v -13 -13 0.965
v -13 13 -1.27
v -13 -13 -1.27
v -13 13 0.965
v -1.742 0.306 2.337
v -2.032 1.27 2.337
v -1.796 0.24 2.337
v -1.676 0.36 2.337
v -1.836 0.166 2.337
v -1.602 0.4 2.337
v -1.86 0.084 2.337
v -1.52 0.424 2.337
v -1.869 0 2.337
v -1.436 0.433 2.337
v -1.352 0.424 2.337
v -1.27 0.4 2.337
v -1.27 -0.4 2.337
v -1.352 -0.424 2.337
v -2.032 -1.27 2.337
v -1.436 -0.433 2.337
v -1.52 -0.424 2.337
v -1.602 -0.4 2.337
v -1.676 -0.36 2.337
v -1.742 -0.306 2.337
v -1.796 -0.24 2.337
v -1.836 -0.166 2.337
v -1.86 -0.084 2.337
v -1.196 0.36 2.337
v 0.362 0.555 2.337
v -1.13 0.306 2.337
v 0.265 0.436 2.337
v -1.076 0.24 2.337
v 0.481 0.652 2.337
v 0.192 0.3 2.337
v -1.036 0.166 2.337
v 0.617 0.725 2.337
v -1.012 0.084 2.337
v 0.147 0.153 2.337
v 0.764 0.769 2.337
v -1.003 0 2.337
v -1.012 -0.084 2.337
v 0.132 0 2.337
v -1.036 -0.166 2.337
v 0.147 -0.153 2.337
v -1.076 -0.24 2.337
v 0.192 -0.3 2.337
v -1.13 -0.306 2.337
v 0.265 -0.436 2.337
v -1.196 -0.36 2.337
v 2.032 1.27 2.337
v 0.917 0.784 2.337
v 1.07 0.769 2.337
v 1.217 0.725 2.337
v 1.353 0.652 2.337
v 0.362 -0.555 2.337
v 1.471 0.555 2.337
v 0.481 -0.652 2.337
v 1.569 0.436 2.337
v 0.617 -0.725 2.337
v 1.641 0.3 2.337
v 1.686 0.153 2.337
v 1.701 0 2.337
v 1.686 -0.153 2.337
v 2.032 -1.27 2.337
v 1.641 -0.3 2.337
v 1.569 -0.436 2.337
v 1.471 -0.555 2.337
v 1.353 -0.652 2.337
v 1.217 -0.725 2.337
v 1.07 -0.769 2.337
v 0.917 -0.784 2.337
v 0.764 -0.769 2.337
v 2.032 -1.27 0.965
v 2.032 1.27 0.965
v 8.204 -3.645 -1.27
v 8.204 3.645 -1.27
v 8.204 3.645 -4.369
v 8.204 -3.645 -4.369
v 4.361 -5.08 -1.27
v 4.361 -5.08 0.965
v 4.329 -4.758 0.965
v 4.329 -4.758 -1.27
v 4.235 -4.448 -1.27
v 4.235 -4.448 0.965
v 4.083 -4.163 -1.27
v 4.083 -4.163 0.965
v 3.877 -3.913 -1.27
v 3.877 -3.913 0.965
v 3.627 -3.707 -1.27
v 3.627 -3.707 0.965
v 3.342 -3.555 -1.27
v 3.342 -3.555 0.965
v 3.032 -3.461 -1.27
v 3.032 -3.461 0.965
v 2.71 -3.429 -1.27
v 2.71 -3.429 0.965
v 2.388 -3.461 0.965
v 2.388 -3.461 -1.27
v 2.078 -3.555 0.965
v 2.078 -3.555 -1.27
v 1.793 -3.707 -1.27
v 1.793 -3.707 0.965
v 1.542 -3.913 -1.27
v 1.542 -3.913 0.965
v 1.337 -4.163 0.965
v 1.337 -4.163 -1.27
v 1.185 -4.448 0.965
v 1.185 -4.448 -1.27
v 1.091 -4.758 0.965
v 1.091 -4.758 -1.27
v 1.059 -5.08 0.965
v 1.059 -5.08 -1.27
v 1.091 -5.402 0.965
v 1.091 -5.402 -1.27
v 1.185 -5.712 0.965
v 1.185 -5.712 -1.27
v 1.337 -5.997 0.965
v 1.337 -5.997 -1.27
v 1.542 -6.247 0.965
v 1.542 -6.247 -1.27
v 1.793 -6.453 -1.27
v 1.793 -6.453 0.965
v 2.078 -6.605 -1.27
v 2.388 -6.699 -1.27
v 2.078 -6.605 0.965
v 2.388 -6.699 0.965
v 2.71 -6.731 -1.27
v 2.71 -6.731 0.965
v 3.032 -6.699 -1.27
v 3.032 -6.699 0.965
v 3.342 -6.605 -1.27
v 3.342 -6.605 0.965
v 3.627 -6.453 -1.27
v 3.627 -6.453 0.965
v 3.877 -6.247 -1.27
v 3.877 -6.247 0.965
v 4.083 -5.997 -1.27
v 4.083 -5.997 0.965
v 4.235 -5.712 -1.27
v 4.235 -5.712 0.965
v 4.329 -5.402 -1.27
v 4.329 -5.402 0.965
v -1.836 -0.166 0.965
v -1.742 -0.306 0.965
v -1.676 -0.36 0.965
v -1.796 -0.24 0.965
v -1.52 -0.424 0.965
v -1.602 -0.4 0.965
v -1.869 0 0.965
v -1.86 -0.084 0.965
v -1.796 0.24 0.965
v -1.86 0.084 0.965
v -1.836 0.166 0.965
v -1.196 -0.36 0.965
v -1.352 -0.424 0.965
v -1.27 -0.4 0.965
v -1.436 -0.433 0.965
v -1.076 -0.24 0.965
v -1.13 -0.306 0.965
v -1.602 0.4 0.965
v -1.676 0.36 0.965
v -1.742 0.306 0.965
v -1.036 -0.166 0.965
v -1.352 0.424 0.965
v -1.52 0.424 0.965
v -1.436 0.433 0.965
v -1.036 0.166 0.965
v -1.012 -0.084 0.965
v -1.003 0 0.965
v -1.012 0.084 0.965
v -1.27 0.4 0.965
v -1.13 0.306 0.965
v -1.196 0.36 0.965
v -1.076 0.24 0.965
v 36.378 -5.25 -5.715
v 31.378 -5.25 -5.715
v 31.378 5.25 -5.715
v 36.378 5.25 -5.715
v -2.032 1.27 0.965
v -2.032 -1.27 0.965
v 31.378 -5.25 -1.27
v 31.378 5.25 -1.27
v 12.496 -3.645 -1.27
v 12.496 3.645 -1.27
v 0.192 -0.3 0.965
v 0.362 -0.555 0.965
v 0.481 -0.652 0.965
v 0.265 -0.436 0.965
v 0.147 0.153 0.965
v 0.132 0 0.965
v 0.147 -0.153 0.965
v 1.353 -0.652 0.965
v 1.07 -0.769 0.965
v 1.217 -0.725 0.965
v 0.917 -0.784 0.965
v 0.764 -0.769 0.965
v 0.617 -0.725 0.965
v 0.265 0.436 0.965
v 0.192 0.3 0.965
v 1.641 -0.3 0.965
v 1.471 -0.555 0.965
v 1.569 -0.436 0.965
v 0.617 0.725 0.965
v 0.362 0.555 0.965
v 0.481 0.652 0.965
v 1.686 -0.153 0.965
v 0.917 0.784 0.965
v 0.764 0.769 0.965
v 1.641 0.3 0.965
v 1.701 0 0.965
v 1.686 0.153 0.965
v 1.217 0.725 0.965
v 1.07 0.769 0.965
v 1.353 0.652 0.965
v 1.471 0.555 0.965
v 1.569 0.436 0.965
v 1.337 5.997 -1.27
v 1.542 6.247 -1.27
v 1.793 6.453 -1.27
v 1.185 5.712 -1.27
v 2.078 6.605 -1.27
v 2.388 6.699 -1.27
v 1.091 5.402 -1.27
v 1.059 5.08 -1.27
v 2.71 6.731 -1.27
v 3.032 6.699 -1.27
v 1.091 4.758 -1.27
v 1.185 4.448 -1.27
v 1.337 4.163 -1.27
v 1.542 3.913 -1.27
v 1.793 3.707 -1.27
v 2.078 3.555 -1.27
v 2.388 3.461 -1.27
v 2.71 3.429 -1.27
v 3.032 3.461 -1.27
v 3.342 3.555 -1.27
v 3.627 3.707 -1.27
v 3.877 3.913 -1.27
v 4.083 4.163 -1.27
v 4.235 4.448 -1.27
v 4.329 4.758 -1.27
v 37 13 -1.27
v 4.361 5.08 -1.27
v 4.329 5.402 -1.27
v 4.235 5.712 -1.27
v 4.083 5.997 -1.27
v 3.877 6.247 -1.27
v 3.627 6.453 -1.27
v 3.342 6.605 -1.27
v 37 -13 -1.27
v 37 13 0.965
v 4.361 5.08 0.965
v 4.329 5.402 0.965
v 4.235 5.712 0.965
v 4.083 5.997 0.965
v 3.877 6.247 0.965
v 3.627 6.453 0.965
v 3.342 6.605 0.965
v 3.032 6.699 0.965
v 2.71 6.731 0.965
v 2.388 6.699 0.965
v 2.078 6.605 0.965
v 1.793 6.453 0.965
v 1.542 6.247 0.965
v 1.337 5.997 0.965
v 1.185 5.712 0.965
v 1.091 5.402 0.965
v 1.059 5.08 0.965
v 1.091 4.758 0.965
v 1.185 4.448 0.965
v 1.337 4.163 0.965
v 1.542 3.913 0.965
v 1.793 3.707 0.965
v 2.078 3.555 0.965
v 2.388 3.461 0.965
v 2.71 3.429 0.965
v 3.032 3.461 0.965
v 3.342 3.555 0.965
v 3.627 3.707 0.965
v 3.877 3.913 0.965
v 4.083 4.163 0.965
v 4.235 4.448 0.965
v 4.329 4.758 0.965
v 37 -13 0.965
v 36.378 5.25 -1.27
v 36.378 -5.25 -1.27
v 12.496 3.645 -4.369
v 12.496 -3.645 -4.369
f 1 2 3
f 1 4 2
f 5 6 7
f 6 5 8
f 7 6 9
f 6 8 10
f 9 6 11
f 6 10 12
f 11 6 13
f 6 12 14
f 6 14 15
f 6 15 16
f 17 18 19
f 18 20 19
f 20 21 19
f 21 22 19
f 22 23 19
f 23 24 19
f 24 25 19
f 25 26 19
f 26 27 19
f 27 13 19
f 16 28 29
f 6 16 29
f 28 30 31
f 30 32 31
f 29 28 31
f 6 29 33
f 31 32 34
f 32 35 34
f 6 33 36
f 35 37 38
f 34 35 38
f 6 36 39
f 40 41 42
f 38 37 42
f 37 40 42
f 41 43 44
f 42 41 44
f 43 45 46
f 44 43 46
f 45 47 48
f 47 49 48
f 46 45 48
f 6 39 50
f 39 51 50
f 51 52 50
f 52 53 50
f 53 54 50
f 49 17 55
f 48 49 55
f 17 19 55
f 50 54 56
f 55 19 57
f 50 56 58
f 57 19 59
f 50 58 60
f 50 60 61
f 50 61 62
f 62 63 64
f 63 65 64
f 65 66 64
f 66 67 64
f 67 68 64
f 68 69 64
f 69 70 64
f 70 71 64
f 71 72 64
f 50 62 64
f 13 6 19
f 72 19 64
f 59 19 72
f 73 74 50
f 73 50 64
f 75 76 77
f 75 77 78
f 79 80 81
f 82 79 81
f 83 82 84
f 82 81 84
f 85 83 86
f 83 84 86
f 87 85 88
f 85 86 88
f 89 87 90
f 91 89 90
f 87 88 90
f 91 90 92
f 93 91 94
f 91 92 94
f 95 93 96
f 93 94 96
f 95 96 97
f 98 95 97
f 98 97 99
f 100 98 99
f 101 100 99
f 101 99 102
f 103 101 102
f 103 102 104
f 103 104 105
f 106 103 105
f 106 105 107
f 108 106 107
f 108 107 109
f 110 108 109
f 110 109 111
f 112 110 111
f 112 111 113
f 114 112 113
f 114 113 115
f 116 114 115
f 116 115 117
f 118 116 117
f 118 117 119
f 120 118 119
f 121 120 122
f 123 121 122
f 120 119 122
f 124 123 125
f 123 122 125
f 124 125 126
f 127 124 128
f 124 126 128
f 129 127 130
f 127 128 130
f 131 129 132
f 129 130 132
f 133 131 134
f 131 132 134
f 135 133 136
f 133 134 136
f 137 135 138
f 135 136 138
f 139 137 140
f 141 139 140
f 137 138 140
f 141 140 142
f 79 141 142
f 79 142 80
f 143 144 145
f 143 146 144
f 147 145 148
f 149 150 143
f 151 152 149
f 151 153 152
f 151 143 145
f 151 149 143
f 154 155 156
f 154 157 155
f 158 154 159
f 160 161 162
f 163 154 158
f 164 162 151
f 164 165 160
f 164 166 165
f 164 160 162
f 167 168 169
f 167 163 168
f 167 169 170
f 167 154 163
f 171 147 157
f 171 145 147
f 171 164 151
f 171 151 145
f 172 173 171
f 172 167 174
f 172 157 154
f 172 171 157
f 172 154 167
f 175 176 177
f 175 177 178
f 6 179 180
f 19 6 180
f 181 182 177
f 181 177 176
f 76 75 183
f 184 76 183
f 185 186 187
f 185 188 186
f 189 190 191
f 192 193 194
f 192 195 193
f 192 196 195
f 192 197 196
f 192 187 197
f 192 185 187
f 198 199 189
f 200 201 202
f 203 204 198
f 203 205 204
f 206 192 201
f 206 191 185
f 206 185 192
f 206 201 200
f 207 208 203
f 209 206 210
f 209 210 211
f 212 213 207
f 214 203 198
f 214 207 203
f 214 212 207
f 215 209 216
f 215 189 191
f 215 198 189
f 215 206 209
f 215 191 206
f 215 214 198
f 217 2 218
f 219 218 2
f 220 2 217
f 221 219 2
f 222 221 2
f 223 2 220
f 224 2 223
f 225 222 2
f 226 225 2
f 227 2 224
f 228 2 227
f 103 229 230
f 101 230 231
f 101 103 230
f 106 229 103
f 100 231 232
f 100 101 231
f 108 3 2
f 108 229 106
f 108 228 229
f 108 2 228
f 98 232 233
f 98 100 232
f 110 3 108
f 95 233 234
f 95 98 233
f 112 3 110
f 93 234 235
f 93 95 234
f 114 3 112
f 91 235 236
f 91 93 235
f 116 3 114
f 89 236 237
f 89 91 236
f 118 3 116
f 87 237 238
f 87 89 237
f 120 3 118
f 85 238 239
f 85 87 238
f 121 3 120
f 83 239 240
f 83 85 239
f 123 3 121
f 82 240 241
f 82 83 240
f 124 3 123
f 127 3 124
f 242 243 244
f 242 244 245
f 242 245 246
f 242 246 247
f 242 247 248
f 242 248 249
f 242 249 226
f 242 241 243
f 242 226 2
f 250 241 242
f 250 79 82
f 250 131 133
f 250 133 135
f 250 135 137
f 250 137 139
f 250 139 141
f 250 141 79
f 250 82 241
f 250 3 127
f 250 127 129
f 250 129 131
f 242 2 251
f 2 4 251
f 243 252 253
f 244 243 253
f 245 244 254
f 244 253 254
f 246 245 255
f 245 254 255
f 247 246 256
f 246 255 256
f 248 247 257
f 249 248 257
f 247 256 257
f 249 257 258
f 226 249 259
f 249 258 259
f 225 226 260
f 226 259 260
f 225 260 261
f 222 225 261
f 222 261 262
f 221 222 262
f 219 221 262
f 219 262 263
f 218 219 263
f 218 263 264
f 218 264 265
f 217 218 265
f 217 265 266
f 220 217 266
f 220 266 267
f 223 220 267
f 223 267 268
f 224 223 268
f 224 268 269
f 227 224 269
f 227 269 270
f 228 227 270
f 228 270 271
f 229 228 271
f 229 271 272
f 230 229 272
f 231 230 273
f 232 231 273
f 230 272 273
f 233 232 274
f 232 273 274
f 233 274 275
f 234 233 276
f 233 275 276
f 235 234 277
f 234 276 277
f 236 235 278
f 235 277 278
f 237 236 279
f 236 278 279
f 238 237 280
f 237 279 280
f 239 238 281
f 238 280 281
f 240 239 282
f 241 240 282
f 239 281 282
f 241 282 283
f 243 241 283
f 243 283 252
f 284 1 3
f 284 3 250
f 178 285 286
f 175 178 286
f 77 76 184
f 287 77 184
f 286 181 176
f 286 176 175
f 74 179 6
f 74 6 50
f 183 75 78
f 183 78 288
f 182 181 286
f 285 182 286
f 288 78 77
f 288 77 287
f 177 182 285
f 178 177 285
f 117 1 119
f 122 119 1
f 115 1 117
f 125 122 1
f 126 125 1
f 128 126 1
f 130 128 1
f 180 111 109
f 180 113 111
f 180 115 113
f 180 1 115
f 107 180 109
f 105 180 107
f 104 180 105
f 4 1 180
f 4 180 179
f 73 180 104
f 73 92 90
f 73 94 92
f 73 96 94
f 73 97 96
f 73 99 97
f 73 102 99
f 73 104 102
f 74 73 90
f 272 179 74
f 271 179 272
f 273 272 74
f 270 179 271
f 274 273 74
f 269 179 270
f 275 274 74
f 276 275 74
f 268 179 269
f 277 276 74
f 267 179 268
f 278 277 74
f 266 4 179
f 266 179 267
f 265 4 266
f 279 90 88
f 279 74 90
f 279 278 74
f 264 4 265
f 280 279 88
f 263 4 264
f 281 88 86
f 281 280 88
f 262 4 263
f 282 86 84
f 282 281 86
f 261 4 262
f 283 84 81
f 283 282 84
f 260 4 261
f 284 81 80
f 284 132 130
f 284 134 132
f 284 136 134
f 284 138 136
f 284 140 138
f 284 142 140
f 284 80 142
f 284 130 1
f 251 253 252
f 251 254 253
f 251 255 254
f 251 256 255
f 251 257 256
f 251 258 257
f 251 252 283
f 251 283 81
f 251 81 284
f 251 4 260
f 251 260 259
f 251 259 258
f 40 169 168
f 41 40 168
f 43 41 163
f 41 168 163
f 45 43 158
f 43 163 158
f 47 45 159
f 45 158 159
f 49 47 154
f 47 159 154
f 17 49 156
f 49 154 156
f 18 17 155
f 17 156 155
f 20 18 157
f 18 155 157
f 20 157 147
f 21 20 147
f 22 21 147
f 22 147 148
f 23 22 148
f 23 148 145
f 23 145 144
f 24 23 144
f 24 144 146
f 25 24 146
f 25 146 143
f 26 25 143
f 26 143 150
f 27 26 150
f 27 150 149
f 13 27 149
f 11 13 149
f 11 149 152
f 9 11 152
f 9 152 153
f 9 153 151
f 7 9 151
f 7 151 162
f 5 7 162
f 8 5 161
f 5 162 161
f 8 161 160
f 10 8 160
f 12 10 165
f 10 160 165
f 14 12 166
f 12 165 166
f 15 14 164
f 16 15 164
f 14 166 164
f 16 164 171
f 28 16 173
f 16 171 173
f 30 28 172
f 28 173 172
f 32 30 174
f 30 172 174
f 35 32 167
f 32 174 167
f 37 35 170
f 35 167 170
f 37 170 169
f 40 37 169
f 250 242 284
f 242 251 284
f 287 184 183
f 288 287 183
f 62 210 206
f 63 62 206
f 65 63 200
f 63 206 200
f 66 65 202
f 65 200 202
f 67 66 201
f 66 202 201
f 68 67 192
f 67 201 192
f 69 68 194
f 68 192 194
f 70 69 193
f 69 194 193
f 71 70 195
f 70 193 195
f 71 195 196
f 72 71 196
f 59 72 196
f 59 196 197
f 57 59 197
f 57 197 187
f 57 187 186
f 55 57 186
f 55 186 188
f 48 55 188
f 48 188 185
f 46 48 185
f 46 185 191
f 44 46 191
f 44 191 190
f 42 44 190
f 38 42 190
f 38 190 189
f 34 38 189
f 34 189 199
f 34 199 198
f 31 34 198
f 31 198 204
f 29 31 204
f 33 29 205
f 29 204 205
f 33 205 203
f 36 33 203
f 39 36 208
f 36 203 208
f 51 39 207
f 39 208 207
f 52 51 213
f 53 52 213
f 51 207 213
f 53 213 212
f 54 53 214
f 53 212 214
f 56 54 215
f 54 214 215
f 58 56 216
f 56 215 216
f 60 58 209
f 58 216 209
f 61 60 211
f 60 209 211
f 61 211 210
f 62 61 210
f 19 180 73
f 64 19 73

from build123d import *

# Parameters (mm, degrees)
F0_W      = 50
F0_H      = 26
F1_DEPTH  = 0.9652
F3_W      = 4.064
F3_H      = 2.54
F3_R      = 0.432705
F3_R_2    = 0.784328
F4_DEPTH  = 2.3368
F4_FACE_W = 50
F4_FACE_H = 26
F5_DEPTH  = 1.27
F7_R      = 1.651
F8_DEPTH  = 25.4
F6_W      = 4.2926
F6_H      = 7.2898
F9_DEPTH  = 3.0988
F11_W     = 5
F11_H     = 10.5
F12_DEPTH = 4.445


with BuildPart() as f1:
    # F0 (on Top) → F1 (new body)
    with BuildSketch(Plane.XY):
        Rectangle(F0_W, F0_H)
    extrude(amount=F1_DEPTH)


with BuildPart() as f1_1:
    # F2: moved
    add(f1.part.moved(Location((12, 0, 0))))

    # F3 (on face) → F4 (join)
    with BuildSketch(Plane(origin=(0, 0, 0), x_dir=(1, 0, 0), z_dir=(0, 0, -1))):
        Rectangle(F3_W, F3_H)
        with Locations((-1.436029, 0)):
            Circle(F3_R, mode=Mode.SUBTRACT)
        with Locations((0.916756, 0)):
            Circle(F3_R_2, mode=Mode.SUBTRACT)
    extrude(amount=-F4_DEPTH)

    # F4_face (on face) → F5 (join)
    with BuildSketch(Plane(origin=(12, 0, 0), x_dir=(1, 0, 0), z_dir=(0, 0, -1))):
        Rectangle(F4_FACE_W, F4_FACE_H)
    extrude(amount=F5_DEPTH)

    # F7 (on face) → F8 (cut)
    with BuildSketch(Plane.XY.offset(0.9652)):
        with Locations((2.7099, 5.08)):
            Circle(F7_R)
        with Locations((2.7099, -5.08)):
            Circle(F7_R)
    extrude(amount=-F8_DEPTH, mode=Mode.SUBTRACT)


with BuildPart() as f9:
    # F6 (on face) → F9 (new body)
    with BuildSketch(Plane(origin=(0, 0, -1.27), x_dir=(1, 0, 0), z_dir=(0, 0, -1))):
        Rectangle(F6_W, F6_H)
    extrude(amount=F9_DEPTH)


with BuildPart() as f9_1:
    # F10: moved
    add(f9.part.moved(Location((10.35, 0, 0))))


with BuildPart() as f12:
    # F11 (on face) → F12 (new body)
    with BuildSketch(Plane(origin=(0, 0, -1.27), x_dir=(1, 0, 0), z_dir=(0, 0, -1))):
        with Locations((21.152385, 0)):
            Rectangle(F11_W, F11_H)
    extrude(amount=F12_DEPTH)


with BuildPart() as f12_1:
    # F13: moved
    add(f12.part.moved(Location((8.636, 0, 0))))


with BuildPart() as f12_2:
    # F14: moved
    add(f12_1.part.moved(Location((4.0894, 0, 0))))


solid = Compound([f1_1.part, f9_1.part, f12_2.part])
